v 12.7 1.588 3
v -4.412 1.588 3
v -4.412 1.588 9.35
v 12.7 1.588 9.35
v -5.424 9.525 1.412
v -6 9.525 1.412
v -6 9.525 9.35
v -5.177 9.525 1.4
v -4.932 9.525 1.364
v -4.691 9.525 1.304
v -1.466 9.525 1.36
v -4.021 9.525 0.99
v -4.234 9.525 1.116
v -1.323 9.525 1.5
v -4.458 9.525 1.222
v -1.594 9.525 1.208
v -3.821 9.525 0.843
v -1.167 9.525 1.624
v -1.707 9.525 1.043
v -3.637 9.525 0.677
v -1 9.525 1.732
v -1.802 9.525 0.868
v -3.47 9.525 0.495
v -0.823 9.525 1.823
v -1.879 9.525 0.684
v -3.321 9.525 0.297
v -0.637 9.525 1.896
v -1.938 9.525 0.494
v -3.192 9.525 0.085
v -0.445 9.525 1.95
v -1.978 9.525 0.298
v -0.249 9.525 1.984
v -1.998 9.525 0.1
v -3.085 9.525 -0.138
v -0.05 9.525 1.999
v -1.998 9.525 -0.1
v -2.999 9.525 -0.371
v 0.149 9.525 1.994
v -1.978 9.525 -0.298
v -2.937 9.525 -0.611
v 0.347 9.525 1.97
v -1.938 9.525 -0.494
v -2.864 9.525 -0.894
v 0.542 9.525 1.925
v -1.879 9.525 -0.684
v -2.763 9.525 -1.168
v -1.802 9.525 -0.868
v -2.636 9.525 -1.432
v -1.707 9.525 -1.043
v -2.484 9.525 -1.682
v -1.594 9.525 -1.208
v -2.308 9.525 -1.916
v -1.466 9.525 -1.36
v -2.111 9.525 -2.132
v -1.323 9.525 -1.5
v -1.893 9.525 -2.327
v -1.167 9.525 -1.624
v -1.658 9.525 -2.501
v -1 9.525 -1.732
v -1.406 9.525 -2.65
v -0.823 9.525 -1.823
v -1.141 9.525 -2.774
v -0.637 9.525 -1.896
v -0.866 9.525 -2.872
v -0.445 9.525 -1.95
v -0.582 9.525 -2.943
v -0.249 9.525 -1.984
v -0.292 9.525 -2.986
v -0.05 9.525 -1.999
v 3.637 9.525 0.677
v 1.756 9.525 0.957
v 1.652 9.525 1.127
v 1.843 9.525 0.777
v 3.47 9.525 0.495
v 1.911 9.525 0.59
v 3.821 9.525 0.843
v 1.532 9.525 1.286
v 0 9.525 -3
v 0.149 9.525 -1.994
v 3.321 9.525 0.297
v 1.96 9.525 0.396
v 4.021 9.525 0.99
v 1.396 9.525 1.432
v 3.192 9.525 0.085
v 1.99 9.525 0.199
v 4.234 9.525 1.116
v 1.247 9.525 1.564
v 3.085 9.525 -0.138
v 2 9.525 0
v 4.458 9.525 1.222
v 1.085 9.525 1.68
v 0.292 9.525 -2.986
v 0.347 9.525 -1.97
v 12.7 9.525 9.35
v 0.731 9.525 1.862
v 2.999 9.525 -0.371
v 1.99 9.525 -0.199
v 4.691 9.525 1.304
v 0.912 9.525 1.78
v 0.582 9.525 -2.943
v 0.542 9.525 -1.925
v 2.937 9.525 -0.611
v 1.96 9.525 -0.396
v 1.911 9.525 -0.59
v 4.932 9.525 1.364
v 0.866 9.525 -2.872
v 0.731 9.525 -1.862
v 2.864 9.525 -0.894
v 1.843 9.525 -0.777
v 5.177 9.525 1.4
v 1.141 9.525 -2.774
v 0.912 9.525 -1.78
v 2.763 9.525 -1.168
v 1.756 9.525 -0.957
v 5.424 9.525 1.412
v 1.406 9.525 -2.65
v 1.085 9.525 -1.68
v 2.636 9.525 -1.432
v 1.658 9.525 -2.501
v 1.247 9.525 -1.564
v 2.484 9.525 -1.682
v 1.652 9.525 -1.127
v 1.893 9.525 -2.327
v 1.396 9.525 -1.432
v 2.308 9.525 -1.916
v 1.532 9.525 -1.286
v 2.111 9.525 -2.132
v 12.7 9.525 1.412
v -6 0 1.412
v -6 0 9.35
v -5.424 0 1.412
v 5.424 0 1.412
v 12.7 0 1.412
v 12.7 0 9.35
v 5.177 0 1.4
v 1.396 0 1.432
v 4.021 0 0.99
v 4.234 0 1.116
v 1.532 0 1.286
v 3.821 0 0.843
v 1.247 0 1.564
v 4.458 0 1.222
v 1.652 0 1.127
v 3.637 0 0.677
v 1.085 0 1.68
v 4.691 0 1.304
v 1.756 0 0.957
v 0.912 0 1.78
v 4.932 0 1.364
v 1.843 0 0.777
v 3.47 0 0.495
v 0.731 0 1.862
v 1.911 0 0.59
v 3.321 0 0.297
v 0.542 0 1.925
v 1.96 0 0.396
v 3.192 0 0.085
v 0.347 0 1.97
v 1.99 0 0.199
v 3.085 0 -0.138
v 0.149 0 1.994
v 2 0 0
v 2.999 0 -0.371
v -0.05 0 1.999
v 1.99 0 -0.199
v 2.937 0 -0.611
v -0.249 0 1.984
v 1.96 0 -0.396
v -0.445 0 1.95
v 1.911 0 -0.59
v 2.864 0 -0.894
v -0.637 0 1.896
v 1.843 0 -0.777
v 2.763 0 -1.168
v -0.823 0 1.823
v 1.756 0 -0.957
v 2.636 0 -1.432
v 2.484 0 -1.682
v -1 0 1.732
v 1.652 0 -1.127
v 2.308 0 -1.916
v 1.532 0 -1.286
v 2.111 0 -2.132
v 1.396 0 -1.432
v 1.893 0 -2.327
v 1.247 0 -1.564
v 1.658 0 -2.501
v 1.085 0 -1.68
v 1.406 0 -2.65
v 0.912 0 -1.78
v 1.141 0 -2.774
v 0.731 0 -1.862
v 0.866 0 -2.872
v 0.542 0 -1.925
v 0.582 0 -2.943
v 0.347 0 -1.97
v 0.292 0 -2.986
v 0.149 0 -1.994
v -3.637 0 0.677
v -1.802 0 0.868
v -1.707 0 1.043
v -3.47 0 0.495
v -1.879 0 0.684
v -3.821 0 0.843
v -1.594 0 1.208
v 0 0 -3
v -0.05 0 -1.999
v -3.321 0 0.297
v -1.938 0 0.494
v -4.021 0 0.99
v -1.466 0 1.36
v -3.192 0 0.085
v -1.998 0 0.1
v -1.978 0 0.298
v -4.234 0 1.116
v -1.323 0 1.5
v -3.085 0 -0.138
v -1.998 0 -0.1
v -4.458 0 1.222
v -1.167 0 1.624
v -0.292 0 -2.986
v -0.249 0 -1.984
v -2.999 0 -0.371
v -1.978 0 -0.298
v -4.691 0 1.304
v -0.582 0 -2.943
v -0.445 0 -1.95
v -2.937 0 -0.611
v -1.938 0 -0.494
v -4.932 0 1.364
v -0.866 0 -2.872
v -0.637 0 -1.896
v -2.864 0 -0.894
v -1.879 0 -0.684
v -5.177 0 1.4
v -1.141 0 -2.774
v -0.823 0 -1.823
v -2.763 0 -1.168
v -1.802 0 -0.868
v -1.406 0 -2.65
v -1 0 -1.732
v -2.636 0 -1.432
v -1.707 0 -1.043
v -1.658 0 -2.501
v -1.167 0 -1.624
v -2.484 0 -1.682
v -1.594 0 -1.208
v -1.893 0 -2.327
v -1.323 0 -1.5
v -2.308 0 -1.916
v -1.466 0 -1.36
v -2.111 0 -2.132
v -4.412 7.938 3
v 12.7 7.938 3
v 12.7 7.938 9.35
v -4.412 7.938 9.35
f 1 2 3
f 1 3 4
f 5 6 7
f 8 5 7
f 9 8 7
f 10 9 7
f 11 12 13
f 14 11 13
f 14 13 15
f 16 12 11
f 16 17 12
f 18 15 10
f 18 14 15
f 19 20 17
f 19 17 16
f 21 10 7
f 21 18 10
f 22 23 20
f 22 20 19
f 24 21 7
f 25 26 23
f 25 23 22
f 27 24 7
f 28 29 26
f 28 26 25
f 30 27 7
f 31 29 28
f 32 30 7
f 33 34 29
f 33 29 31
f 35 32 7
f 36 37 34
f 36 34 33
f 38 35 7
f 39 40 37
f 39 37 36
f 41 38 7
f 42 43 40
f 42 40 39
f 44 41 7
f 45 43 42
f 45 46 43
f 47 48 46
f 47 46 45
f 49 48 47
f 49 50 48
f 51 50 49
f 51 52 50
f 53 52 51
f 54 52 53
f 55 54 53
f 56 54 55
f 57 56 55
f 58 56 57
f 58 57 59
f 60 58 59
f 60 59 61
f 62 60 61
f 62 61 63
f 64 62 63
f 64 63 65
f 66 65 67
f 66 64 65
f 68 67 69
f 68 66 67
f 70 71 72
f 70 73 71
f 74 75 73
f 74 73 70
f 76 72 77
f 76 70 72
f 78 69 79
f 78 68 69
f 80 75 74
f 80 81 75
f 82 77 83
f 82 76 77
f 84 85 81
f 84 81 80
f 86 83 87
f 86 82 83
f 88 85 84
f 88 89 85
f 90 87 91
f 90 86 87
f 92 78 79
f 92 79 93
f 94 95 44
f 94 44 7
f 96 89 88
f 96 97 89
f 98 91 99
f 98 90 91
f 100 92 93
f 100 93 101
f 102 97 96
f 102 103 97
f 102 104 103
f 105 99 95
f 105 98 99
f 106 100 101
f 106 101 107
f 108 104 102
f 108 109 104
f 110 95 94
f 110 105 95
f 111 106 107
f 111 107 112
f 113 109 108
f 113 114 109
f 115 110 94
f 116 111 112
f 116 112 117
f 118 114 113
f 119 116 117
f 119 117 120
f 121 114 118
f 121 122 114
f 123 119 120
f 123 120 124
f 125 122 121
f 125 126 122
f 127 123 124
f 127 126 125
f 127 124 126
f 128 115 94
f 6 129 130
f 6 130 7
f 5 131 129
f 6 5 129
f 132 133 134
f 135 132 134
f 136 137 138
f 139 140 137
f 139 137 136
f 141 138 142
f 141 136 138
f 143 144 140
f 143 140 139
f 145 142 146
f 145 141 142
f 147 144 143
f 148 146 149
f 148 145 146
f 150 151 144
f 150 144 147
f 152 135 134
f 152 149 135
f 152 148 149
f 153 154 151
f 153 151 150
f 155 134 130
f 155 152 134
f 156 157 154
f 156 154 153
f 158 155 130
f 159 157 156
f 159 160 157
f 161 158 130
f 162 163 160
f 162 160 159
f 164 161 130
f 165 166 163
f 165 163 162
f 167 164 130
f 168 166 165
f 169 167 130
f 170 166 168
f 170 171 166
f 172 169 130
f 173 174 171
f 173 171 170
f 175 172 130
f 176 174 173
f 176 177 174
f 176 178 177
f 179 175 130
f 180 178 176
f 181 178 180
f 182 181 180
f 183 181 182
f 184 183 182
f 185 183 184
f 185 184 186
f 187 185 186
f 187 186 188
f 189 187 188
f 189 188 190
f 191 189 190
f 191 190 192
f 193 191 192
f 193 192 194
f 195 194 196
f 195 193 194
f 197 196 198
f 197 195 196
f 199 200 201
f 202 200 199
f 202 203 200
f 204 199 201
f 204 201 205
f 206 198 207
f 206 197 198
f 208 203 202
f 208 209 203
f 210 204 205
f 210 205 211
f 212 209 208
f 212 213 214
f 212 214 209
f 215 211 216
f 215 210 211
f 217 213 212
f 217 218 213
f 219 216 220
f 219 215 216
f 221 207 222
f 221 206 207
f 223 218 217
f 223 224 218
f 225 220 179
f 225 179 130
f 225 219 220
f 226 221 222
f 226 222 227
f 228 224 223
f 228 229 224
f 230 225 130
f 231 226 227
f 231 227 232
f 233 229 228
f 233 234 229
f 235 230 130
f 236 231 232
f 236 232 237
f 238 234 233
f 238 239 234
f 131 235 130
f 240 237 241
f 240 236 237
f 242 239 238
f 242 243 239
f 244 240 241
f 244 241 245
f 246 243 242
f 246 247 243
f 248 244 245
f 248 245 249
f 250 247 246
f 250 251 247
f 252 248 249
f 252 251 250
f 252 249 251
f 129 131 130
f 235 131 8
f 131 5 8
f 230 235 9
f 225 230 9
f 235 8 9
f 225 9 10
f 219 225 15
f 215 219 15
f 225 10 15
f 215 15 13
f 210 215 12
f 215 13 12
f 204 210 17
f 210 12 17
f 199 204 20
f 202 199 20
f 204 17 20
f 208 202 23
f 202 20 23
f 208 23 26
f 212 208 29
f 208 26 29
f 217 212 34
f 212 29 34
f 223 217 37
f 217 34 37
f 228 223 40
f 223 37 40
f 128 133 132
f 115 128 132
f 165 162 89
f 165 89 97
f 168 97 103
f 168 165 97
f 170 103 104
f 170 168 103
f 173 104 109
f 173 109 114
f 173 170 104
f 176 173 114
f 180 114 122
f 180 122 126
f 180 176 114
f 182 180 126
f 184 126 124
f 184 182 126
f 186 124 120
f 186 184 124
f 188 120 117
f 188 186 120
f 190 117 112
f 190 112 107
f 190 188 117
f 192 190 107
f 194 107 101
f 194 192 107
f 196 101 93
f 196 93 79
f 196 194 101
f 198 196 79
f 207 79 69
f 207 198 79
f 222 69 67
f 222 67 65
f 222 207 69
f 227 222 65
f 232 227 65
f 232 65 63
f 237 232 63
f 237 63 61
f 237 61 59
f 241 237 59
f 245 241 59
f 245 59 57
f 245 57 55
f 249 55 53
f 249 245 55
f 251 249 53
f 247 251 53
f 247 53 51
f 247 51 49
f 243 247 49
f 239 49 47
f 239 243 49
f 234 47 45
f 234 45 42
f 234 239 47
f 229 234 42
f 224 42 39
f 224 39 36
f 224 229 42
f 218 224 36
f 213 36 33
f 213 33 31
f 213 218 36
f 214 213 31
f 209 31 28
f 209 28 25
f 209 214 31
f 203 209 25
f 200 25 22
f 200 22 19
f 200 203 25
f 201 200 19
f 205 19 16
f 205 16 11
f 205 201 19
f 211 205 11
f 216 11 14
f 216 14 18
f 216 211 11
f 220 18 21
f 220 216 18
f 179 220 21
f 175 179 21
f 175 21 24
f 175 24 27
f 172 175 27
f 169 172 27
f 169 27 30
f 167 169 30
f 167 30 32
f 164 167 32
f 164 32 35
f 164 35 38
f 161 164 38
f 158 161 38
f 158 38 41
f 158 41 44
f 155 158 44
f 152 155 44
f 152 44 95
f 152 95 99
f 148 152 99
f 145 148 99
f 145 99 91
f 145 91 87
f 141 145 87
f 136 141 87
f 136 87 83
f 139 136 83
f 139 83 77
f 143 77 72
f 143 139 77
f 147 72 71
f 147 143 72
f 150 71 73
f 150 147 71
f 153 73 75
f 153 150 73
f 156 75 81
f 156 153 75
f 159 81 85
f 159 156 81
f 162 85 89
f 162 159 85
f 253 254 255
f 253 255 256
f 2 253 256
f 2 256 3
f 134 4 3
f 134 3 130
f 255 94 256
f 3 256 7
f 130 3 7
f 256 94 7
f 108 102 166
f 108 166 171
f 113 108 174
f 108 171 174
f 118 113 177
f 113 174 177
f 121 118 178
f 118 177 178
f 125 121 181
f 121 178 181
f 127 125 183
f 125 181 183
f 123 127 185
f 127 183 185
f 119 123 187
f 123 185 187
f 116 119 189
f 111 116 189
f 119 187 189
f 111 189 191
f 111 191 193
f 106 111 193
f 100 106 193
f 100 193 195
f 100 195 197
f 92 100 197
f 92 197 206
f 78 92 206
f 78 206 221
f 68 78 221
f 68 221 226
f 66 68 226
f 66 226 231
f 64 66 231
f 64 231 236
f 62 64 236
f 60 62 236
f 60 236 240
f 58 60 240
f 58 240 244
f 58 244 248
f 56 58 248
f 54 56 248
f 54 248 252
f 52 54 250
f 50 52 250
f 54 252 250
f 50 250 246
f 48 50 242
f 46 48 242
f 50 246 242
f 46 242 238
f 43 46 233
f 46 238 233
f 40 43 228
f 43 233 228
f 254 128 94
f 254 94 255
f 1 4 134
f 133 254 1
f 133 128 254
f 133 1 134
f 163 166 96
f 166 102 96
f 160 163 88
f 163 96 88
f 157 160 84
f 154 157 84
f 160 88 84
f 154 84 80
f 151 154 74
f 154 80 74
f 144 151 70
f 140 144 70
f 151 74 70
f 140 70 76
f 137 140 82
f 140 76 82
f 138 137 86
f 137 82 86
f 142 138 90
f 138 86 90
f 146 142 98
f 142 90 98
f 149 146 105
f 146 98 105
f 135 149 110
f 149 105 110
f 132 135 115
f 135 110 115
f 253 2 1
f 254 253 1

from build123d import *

# Parameters (mm, degrees)
SKETCH1_R           = 2
BOSS_EXTRUDE1_DEPTH = 9.525
FILLET1_R           = 2.54
BOSS_EXTRUDE2_DEPTH = 6.35


with BuildPart() as part:
    # Sketch1 → Boss-Extrude1 (new body)
    with BuildSketch(Plane(origin=(0, 0, 0), x_dir=(1, 0, 0), z_dir=(0, 1, 0))):
        with BuildLine():
            Line((-6, -1.4125), (-6, -3))
            Line((-6, -3), (12.7, -3))
            Line((12.7, -3), (12.7, -1.4125))
            Line((12.7, -1.4125), (2.646666535, -1.4125))
            ThreePointArc((2.646666535, -1.4125), (0, 3), (-2.646666535, -1.4125))
            Line((-2.646666535, -1.4125), (-6, -1.4125))
        make_face()
        Circle(SKETCH1_R, mode=Mode.SUBTRACT)
    extrude(amount=BOSS_EXTRUDE1_DEPTH)

    # Fillet1
    fillet1_edges = [part.edges().sort_by_distance(p)[0] for p in [
        (-2.646666535, 4.7625, 1.4125),
        (2.646666535, 4.7625, 1.4125),
    ]]
    fillet(fillet1_edges, radius=FILLET1_R)

    # Sketch2 → Boss-Extrude2 (add)
    with BuildSketch(Plane.XY.offset(3)):
        Polygon((12.7, 0), (-6, 0), (-6, 9.525), (12.7, 9.525), (12.7, 7.9375), (-4.4125, 7.9375), (-4.4125, 1.5875), (12.7, 1.5875), align=None)
    extrude(amount=BOSS_EXTRUDE2_DEPTH)


solid = part.part
